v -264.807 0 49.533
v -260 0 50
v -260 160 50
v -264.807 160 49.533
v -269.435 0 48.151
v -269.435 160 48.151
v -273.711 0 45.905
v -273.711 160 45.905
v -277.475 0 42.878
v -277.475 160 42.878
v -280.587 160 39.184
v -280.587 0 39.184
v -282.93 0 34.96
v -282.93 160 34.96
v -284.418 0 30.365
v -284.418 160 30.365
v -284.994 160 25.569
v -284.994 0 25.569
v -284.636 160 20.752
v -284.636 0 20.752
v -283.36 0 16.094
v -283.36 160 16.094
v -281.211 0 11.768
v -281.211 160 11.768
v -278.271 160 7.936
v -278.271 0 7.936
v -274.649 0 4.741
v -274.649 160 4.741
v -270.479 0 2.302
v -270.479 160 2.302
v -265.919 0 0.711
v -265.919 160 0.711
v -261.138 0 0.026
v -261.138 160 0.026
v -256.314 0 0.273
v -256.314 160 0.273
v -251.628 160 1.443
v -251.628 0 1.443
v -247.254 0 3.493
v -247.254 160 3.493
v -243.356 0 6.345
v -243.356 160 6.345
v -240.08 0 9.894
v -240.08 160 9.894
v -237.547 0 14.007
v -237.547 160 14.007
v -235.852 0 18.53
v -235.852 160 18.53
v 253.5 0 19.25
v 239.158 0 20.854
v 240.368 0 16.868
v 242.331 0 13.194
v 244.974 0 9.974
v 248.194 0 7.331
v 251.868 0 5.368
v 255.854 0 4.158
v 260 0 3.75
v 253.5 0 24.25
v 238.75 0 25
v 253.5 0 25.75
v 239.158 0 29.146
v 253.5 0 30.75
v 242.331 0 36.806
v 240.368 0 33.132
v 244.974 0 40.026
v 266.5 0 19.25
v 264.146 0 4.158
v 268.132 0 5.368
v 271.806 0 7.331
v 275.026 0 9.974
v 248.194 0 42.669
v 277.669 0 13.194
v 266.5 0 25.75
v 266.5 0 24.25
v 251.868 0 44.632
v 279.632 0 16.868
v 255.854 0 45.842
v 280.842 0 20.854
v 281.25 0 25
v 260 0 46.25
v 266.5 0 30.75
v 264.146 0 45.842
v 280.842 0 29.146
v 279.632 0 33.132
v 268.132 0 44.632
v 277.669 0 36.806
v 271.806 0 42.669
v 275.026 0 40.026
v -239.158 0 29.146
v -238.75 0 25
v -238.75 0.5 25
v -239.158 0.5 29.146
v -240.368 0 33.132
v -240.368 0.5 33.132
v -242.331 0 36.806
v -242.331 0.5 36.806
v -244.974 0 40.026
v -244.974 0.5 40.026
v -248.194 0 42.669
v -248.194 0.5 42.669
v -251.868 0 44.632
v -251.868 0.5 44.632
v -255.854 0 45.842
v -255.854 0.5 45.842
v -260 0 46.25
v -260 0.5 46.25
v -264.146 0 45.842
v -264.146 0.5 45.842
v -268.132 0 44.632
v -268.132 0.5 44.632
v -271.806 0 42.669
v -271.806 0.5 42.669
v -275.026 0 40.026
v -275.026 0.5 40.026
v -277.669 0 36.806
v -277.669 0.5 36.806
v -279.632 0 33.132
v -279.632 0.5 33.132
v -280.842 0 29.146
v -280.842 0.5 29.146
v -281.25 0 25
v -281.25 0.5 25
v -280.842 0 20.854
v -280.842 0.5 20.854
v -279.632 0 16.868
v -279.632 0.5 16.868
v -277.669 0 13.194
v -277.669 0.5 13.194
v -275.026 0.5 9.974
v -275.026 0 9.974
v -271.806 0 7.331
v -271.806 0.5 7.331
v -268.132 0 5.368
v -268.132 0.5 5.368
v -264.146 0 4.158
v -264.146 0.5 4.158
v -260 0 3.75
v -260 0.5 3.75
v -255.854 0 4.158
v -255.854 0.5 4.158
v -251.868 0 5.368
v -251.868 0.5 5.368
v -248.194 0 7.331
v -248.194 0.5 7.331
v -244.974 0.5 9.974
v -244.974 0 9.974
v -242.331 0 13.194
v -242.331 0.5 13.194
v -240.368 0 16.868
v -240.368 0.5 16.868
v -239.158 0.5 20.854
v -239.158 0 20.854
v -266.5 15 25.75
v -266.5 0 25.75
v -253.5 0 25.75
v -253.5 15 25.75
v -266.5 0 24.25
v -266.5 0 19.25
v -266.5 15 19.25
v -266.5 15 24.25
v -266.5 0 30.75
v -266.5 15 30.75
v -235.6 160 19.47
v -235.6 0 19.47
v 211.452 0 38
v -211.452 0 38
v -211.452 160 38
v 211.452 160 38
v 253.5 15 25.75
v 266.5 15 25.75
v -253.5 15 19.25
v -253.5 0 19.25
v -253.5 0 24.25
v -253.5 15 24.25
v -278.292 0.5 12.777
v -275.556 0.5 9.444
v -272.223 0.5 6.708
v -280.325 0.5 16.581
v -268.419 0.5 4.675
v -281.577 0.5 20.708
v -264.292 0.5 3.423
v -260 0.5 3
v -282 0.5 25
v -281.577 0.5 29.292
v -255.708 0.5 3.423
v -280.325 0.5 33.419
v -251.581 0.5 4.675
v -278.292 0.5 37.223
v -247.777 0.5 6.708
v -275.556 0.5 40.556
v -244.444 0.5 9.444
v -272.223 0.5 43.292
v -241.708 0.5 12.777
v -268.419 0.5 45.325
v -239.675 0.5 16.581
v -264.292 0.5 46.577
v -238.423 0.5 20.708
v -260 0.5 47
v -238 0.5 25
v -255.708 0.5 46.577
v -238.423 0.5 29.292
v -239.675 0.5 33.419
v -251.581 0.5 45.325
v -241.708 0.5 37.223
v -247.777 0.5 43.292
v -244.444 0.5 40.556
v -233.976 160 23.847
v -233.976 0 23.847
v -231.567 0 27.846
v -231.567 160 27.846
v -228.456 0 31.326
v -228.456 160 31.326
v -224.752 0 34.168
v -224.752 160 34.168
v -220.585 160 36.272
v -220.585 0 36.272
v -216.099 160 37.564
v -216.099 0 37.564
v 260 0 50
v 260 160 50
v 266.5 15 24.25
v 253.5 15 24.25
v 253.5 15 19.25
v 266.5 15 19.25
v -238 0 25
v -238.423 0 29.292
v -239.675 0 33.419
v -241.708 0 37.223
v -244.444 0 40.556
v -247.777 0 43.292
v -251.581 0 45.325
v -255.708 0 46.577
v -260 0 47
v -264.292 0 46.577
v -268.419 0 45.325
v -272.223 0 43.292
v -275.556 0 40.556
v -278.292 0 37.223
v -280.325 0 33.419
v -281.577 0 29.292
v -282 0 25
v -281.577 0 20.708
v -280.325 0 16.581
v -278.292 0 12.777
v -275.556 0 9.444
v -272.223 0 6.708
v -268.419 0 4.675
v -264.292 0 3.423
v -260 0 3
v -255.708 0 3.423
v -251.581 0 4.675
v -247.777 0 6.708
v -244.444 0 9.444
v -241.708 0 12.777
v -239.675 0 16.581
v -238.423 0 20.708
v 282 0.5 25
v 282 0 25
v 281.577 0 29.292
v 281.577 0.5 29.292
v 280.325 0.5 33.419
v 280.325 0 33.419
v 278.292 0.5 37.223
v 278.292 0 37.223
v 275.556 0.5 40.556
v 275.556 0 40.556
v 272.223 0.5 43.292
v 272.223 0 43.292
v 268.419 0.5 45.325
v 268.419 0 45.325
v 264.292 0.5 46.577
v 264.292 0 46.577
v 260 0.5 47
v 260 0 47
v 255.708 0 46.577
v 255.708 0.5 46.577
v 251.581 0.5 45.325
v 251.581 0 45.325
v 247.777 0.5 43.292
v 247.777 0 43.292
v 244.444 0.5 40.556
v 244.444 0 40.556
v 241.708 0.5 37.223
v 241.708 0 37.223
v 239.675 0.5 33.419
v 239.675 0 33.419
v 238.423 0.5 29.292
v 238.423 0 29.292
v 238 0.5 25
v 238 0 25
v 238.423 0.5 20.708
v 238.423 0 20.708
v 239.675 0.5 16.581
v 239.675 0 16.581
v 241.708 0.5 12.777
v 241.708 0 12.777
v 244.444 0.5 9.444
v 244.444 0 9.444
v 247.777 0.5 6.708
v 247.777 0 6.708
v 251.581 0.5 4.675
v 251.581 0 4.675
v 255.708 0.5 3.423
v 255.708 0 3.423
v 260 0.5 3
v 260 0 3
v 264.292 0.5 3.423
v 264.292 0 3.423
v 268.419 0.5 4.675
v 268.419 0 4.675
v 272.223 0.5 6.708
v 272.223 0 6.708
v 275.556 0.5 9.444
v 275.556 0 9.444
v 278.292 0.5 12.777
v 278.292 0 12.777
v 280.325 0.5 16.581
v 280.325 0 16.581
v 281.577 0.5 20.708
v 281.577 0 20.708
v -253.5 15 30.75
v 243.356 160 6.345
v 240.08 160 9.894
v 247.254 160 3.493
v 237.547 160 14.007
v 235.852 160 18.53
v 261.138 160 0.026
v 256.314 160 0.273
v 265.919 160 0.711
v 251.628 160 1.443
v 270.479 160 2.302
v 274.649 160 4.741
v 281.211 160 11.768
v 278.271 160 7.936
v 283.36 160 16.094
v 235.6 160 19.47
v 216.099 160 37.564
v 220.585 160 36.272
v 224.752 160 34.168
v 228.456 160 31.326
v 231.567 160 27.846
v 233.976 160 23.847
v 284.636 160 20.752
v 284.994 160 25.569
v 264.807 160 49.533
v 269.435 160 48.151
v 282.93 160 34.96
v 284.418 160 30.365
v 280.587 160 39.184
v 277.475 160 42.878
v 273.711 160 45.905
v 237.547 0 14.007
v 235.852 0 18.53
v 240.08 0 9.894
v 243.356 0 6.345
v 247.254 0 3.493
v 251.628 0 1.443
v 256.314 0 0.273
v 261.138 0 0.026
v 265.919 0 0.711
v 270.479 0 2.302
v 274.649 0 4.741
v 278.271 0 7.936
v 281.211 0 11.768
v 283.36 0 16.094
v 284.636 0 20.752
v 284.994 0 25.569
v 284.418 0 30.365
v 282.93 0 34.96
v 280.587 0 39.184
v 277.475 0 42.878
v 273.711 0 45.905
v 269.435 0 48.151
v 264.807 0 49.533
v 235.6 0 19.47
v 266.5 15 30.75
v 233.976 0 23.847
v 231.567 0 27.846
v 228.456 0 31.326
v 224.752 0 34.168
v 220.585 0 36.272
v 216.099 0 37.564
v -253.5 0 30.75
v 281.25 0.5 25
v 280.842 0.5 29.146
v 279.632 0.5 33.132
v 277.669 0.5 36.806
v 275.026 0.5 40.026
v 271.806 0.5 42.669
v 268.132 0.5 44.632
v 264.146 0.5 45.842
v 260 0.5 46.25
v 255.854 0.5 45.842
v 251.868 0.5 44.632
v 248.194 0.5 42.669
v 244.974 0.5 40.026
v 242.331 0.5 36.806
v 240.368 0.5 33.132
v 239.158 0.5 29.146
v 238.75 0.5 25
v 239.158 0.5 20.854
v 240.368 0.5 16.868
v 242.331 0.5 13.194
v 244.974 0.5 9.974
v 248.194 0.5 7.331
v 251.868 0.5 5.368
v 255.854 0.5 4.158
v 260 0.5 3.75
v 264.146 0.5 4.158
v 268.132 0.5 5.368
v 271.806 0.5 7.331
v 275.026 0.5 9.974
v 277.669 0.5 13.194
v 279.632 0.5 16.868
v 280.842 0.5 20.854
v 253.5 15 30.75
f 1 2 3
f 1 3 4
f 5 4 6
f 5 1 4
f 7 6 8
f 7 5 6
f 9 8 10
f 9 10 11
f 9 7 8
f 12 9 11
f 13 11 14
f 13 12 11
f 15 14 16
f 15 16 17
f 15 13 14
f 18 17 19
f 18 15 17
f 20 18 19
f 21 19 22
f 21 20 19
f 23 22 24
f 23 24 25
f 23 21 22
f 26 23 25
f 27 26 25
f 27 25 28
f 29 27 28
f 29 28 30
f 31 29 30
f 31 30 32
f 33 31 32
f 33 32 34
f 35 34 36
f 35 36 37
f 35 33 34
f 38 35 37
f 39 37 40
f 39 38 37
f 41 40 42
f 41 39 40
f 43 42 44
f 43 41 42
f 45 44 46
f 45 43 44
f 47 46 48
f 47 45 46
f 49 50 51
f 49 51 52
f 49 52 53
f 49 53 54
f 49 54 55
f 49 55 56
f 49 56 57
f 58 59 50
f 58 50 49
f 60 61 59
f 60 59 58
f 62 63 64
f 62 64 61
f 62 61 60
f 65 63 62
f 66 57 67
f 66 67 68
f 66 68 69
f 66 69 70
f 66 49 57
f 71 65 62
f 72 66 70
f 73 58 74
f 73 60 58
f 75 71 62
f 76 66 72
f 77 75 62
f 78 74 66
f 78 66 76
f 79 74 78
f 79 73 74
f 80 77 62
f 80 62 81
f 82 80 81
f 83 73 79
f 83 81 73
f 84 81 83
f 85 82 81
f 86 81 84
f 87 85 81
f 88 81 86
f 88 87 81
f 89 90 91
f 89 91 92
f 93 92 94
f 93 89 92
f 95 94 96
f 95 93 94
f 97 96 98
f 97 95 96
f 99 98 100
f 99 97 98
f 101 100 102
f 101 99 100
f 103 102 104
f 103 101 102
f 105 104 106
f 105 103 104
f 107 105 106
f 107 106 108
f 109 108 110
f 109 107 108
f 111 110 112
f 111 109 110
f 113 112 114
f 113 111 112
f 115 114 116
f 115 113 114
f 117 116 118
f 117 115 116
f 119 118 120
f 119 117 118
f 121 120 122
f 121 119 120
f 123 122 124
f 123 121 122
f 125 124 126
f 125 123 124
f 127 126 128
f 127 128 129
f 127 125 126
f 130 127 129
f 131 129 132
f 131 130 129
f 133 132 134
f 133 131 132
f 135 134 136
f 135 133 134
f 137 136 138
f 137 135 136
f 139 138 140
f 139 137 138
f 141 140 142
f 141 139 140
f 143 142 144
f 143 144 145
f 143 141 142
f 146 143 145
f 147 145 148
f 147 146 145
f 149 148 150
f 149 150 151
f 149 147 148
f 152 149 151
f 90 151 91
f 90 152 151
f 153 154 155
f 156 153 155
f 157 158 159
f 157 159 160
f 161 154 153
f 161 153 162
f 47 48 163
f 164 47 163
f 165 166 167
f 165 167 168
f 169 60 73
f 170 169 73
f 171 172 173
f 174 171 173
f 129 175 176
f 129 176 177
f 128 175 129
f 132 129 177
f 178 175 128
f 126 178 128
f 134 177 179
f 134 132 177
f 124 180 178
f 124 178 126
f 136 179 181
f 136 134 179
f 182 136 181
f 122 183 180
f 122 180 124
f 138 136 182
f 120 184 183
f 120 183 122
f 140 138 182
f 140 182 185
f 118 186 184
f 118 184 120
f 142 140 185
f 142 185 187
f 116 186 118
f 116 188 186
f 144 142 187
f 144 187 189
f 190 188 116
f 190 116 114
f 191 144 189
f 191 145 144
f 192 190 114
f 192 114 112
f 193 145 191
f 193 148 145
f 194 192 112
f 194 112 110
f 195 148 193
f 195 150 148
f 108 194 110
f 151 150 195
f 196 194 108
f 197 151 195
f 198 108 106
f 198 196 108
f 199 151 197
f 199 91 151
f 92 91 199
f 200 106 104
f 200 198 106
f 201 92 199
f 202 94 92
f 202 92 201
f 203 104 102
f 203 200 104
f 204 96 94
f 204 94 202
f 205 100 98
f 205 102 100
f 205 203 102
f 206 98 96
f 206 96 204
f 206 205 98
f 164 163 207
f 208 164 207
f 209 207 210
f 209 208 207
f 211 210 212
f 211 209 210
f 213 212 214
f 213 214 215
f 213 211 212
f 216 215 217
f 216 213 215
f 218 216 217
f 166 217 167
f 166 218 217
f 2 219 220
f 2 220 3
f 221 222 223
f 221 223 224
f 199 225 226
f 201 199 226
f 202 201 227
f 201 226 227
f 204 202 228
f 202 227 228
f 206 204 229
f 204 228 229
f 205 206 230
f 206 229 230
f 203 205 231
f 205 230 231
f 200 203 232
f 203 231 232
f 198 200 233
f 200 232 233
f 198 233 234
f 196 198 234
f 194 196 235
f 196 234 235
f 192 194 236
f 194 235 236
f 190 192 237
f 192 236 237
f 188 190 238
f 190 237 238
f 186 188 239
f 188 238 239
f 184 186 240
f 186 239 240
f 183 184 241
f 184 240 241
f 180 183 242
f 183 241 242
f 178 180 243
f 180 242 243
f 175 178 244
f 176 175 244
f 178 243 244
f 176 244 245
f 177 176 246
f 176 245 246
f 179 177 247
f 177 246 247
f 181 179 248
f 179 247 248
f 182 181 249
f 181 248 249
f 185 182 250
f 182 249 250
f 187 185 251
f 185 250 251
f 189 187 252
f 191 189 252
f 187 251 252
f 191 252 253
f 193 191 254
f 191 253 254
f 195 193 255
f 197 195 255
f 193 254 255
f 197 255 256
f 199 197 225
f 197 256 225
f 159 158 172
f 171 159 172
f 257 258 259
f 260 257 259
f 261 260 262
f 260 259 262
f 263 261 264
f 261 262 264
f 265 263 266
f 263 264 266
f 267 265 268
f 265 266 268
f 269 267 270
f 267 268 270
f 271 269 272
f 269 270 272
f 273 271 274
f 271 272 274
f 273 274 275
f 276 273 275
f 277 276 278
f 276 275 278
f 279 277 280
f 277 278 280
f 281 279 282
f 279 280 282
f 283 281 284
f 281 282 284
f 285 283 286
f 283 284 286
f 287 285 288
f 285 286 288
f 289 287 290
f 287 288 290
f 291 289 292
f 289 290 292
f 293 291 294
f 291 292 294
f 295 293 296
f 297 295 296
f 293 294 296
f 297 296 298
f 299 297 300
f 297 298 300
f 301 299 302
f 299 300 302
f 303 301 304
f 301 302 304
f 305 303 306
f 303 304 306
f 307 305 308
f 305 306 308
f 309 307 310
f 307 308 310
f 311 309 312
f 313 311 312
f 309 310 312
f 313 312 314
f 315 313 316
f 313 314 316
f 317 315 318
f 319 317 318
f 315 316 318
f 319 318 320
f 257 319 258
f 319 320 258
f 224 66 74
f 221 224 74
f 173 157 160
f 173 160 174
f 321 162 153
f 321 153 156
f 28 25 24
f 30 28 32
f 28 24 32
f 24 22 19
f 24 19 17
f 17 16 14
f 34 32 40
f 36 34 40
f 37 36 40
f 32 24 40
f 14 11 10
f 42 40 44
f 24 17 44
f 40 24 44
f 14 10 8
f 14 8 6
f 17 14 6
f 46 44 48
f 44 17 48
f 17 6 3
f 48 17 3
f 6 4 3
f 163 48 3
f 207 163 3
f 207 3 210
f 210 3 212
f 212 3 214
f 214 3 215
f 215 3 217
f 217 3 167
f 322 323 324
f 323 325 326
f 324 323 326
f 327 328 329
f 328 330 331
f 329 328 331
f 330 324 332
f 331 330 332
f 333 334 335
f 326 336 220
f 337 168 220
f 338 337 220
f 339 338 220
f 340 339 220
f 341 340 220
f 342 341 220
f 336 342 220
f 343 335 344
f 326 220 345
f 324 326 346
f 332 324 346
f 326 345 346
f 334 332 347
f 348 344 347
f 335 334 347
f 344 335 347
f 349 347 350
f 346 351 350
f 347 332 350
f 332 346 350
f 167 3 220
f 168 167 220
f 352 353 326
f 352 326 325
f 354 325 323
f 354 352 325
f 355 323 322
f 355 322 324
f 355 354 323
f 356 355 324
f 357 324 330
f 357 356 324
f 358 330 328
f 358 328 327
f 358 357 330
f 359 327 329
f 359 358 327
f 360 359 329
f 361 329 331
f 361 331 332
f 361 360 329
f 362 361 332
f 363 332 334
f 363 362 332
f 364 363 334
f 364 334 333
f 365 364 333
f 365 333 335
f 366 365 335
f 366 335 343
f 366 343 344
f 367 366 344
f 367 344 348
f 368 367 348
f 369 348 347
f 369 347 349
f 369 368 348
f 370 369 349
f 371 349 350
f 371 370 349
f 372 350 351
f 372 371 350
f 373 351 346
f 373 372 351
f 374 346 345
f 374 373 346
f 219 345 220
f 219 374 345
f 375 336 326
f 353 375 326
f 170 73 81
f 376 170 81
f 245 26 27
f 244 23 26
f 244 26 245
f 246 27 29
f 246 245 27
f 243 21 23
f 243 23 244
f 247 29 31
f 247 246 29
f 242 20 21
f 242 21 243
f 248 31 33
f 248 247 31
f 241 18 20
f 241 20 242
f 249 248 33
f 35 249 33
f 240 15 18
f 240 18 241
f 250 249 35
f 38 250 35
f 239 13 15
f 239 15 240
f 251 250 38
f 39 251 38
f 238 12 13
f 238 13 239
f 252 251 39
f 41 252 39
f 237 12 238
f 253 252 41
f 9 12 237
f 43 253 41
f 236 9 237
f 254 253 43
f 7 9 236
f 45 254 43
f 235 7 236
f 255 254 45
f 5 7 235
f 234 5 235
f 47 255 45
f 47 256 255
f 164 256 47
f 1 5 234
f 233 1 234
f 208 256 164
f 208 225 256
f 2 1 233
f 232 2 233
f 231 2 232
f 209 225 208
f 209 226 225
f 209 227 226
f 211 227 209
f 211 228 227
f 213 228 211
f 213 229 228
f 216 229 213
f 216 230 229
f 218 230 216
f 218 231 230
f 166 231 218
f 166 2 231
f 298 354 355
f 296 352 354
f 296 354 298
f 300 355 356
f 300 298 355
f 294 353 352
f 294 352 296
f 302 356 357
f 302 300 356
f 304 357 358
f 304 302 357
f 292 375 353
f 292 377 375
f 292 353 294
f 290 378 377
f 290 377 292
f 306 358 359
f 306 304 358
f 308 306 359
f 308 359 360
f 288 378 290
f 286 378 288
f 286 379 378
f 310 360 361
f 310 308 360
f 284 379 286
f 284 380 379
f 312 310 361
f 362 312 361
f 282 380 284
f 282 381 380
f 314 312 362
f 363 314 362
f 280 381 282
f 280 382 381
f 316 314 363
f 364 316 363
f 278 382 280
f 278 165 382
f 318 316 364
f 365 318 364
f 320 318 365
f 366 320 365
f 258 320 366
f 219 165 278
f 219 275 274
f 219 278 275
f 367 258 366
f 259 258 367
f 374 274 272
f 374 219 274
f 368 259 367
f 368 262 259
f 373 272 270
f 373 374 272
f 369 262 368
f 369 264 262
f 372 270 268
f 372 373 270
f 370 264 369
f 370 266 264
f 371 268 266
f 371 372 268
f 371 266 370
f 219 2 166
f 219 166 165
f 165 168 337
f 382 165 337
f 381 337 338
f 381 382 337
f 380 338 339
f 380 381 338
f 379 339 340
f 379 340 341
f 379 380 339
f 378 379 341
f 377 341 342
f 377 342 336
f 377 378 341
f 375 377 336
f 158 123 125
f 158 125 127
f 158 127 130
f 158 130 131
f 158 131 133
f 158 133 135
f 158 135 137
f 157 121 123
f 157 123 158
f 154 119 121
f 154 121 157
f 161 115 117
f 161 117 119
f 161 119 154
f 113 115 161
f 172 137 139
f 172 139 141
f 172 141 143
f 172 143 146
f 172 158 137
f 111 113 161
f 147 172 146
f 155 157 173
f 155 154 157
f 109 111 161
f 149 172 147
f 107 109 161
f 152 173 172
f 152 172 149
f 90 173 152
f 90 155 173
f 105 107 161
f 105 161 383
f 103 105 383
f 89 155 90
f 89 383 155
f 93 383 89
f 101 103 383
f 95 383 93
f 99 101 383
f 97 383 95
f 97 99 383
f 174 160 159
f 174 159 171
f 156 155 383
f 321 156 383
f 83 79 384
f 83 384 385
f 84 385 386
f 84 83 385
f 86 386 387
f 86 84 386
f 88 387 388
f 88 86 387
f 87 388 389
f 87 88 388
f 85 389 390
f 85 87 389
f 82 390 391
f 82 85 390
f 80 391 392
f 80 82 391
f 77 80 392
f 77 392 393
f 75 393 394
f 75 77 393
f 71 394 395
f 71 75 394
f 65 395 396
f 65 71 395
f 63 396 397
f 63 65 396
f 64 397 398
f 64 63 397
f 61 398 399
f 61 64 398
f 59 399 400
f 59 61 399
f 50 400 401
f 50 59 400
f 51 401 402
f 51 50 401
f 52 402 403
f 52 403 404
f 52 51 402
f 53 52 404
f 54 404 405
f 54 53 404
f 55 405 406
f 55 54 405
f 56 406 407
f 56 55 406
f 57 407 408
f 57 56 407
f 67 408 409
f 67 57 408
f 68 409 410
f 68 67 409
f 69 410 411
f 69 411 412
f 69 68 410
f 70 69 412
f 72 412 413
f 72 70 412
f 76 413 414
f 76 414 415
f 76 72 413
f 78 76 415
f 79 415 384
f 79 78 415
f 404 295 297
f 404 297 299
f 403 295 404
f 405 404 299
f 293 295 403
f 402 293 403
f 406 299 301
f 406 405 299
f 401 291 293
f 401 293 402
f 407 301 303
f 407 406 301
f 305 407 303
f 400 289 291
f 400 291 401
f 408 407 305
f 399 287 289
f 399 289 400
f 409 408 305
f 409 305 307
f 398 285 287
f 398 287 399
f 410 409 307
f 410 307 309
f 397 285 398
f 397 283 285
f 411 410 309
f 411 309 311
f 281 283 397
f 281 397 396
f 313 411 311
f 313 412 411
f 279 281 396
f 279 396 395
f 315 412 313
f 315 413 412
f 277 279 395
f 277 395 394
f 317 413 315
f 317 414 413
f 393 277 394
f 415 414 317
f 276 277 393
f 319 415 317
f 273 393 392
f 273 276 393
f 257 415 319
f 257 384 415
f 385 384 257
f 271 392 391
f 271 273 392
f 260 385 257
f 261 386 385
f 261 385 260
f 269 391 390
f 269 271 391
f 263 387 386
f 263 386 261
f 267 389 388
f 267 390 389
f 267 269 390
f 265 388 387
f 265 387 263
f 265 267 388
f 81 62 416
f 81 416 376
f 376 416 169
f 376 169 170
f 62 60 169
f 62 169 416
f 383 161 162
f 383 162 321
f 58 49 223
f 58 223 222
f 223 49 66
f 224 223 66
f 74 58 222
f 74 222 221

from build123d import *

# Parameters (mm, degrees)
F1_DEPTH = 160
F2_R     = 22
F2_R_2   = 21.25
F3_DEPTH = 0.5
F4_W     = 13
F4_H     = 5
F5_DEPTH = 15


with BuildPart() as f1:
    # F0 (on Front) → F1 (new body)
    with BuildSketch(Plane.XZ):
        with BuildLine():
            Line((235.599727, 19.470476), (235.851854, 18.529524))
            ThreePointArc((235.851854, 18.529524), (279.833834, 9.780964), (260, 50))
            Line((260, 50), (0, 50))
            Line((0, 50), (-260, 50))
            ThreePointArc((-260, 50), (-279.833834, 9.780964), (-235.851854, 18.529524))
            Line((-235.851854, 18.529524), (-235.599727, 19.470476))
            ThreePointArc((-235.599727, 19.470476), (-226.670617, 32.833834), (-211.451581, 38))
            Line((-211.451581, 38), (0, 38))
            Line((0, 38), (211.451581, 38))
            ThreePointArc((211.451581, 38), (226.670617, 32.833834), (235.599727, 19.470476))
        make_face()
    extrude(amount=-F1_DEPTH)

    # F2 (on face) → F3 (cut)
    with BuildSketch(Plane.XZ):
        with Locations((260, 25)):
            Circle(F2_R)
        with Locations((260, 25)):
            Circle(F2_R_2, mode=Mode.SUBTRACT)
        with Locations((-260, 25)):
            Circle(F2_R)
        with Locations((-260, 25)):
            Circle(F2_R_2, mode=Mode.SUBTRACT)
    extrude(amount=-F3_DEPTH, mode=Mode.SUBTRACT)

    # F4 (on face) → F5 (cut)
    with BuildSketch(Plane.XZ):
        with Locations((260, 28.25)):
            Rectangle(F4_W, F4_H)
        with Locations((260, 21.75)):
            Rectangle(F4_W, F4_H)
        with Locations((-260, 28.25)):
            Rectangle(F4_W, F4_H)
        with Locations((-260, 21.75)):
            Rectangle(F4_W, F4_H)
    extrude(amount=-F5_DEPTH, mode=Mode.SUBTRACT)


solid = f1.part
